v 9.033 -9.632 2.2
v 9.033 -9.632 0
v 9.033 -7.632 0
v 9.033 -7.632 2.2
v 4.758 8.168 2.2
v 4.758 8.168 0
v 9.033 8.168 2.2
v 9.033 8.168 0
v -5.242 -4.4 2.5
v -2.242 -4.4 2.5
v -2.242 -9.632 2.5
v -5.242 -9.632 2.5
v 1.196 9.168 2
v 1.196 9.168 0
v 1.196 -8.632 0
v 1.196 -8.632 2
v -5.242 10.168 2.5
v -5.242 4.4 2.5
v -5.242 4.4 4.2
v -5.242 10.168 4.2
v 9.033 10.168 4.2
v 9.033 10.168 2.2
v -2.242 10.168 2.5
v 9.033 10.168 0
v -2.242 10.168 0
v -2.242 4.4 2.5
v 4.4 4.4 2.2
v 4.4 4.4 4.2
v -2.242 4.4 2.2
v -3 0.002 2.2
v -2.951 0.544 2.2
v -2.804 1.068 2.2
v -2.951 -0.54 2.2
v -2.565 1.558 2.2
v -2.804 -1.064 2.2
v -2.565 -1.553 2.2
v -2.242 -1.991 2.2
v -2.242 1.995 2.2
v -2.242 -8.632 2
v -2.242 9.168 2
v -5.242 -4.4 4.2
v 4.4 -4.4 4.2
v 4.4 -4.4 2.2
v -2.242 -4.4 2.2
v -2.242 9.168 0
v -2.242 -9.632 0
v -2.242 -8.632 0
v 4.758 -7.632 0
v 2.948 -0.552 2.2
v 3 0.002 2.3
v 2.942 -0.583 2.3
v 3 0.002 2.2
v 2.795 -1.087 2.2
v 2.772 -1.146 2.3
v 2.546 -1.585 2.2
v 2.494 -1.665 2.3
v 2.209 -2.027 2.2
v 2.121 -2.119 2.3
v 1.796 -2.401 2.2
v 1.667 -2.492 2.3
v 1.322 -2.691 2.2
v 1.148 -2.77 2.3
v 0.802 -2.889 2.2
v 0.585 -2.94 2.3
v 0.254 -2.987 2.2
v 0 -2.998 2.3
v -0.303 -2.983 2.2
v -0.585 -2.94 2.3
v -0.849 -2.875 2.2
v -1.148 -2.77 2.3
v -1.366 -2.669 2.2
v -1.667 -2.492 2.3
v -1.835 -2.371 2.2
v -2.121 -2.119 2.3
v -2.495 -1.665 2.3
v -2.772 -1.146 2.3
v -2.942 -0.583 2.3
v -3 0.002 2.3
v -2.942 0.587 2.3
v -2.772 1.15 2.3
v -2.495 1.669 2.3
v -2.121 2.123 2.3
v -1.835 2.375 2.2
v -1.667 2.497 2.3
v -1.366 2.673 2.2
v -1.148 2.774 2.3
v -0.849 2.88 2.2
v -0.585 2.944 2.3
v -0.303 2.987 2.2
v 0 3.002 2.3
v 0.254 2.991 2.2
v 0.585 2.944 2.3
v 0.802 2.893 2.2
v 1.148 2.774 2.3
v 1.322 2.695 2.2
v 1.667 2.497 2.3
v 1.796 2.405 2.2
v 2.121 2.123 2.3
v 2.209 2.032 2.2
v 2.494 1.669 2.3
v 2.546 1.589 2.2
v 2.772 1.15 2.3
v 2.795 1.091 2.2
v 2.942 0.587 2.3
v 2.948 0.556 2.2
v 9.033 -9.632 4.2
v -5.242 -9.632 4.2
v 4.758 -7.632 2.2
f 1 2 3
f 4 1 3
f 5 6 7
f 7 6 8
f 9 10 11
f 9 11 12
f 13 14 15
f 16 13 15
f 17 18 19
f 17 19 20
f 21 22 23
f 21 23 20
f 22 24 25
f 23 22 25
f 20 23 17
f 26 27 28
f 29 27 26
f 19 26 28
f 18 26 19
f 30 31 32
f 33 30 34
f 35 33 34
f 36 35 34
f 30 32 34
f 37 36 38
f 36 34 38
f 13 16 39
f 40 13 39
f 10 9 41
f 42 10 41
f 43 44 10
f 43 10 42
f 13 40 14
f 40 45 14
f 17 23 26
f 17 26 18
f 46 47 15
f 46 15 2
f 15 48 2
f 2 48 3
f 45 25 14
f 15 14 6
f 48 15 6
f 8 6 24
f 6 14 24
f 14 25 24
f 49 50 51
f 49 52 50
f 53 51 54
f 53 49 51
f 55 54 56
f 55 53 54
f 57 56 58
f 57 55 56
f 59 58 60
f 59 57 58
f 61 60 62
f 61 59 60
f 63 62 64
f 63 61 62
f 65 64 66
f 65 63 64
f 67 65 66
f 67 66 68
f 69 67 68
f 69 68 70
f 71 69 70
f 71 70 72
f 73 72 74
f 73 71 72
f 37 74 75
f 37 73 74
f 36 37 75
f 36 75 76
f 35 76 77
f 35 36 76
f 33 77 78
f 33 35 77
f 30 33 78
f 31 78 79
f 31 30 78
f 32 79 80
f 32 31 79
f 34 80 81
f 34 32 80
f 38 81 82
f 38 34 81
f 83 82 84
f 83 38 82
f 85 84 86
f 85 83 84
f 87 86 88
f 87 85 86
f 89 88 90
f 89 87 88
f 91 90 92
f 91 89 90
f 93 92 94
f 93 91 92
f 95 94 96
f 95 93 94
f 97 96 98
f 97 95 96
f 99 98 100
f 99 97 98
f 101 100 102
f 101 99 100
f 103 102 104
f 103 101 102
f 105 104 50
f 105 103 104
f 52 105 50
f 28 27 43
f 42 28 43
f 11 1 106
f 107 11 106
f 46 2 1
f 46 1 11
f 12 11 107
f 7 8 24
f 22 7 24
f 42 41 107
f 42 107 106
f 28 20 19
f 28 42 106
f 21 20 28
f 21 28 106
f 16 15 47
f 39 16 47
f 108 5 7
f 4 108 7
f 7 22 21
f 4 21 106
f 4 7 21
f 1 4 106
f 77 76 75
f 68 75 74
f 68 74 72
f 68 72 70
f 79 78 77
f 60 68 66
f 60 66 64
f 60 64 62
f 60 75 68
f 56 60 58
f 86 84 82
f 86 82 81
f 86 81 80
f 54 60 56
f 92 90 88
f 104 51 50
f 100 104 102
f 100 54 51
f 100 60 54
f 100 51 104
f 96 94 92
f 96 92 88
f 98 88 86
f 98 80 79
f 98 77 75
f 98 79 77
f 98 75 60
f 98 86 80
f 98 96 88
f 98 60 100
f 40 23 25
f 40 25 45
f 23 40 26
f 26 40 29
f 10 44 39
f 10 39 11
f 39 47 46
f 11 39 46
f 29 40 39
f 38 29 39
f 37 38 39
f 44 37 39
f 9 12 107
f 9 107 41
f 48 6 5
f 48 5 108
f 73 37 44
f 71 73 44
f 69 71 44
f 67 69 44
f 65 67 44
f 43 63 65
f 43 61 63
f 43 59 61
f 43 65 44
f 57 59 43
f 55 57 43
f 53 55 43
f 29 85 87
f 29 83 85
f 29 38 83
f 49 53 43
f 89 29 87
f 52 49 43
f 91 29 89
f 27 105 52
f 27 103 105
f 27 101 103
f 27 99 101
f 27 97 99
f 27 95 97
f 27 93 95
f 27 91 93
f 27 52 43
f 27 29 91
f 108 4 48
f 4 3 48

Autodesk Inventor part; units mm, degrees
ref_plane "YZ Plane" through (0, 0, 0) normal (1, 0, 0) x (0, 1, 0)
ref_plane "XZ Plane" through (0, 0, 0) normal (0, 1, 0) x (-1, 0, 0)
ref_plane "Arbeitsebene1" through (0, 0, 0) normal (0, 0, 1) x (1, 0, 0)
sketch "Skizze1" plane through (0, 0, 0) normal (0, 0, 1) x (1, 0, 0)
  circle A0 centre (-0.0001, 0.0021) radius 3 projected
  circle A1 centre (11, 0) radius 2.566 projected
  circle A2 centre (-9.5, -11) radius 1.352 projected
  arc A3 (19, -13.5) -> (20, -12.5) centre (19, -12.5) ccw projected
  line L0 (20, -12.5) -> (20, 12.5) projected
  arc A4 (20, 12.5) -> (19, 13.5) centre (19, 12.5) ccw projected
  line L1 (19, 13.5) -> (-19, 13.5) projected
  arc A5 (-19, 13.5) -> (-20, 12.5) centre (-19, 12.5) ccw projected
  line L2 (-20, 12.5) -> (-20, -12.5) projected
  arc A6 (-20, -12.5) -> (-19, -13.5) centre (-19, -12.5) ccw projected
  line L3 (-19, -13.5) -> (19, -13.5) projected
  line L4 (18.6579, -7.132) -> (11.0758, -7.132) projected
  line L5 (18.6579, -7.132) -> (18.6579, 2.268) projected
  line L6 (18.6579, 2.268) -> (19.6579, 4.268) projected
  line L7 (19.6579, 4.268) -> (19.6579, 7.668) projected
  line L8 (18.0704, 7.668) -> (19.6579, 7.668) projected
  line L9 (18.0704, 7.668) -> (18.0704, 6.818) projected
  line L10 (18.0704, 6.818) -> (13.4704, 6.818) projected
  line L11 (13.4704, 6.818) -> (13.4704, 5.418) projected
  line L12 (13.4704, 5.418) -> (14.8704, 5.418) projected
  line L13 (14.8704, 5.418) -> (15.4704, 6.018) projected
  line L14 (15.4704, 6.018) -> (18.0704, 6.018) projected
  line L15 (18.0704, 6.018) -> (18.0704, 5.768) projected
  line L16 (18.0704, 5.768) -> (15.5704, 5.768) projected
  line L17 (15.5704, 5.768) -> (15.0704, 5.268) projected
  line L18 (15.0704, 5.268) -> (13.0704, 5.268) projected
  line L19 (13.0704, 5.268) -> (13.0704, 7.668) projected
  line L20 (6.4079, 7.668) -> (13.0704, 7.668) projected
  line L21 (6.4079, 7.668) -> (6.4079, 6.468) projected
  line L22 (4.7579, 6.468) -> (6.4079, 6.468) projected
  line L23 (4.7579, -7.132) -> (4.7579, 6.468) projected
  line L24 (5.4458, -7.132) -> (4.7579, -7.132) projected
  line L25 (5.4458, -7.132) -> (5.4458, -6.382) projected
  line L26 (5.4458, -6.382) -> (11.0758, -6.382) projected
  line L27 (11.0758, -6.382) -> (11.0758, -7.132) projected
  line L28 (9.0327, 10.168) -> (-5.2421, 10.168)
  line L29 (-5.2421, 10.168) -> (-5.2421, 8.168)
  line L30 (-5.2421, 8.168) -> (9.0327, 8.168)
  line L31 (9.0327, 8.168) -> (9.0327, 10.168)
  line L32 (-5.2421, 8.168) -> (4.7579, 8.168)
  line L33 (4.7579, 8.168) -> (4.7579, -9.632)
  line L34 (4.7579, -9.632) -> (-5.2421, -9.632)
  line L35 (-5.2421, -9.632) -> (-5.2421, 8.168)
  line L36 (4.7579, -9.632) -> (9.0327, -9.632)
  line L37 (9.0327, -9.632) -> (9.0327, -7.632)
  line L38 (9.0327, -7.632) -> (4.7579, -7.632)
  line L39 (4.7579, -7.632) -> (4.7579, -9.632)
  point P0 (0, 0)
  point P1 (4.7579, 8.168)
  dimension "d0" = 0
  dimension "d1" = 0.5
  dimension "d2" = 0.5
  dimension "d3" = 2
  dimension "d4" = 2
  dimension "d5" = 10
ref_plane "Arbeitsebene2" through (4.7579, -7.132, 2.2) normal (0, 0, 1) x (1, 0, 0)
extrude "Extrusion1" add sketch "Skizze1" along normal up to surface (2.2 mm away) contours A0 | L33 L34 L35 L30 L23 | L38 L37 L36 L33 | L30 L29 L28 L31
sketch "Skizze2" plane through (-5.2421, 10.168, 2.2) normal (0, 0, 1) x (1, 0, 0)
  line L0 (0, 0) -> (14.2747, 0) projected
  line L1 (0, -19.8) -> (0, 0) projected
  line L2 (14.2747, -19.8) -> (0, -19.8) projected
  line L3 (14.2747, -17.8) -> (14.2747, -19.8) projected
  line L4 (10, -17.8) -> (14.2747, -17.8) projected
  line L5 (10, -2) -> (10, -17.8) projected
  line L6 (14.2747, -2) -> (10, -2) projected
  line L7 (14.2747, 0) -> (14.2747, -2) projected
  line L8 (14.2747, 0) -> (0, 0) projected
  line L9 (14.2747, 0) -> (0, 0)
  line L10 (0, 0) -> (0, -19.8)
  line L11 (0, -19.8) -> (14.2747, -19.8)
  line L12 (14.2747, -19.8) -> (14.2747, 0)
  line L13 (9.6421, -14.568) -> (0.8421, -14.568)
  line L14 (0.8421, -14.568) -> (0.8421, -5.768)
  line L15 (0.8421, -5.768) -> (9.6421, -5.768)
  line L16 (9.6421, -5.768) -> (9.6421, -14.568)
  line L17 (9.6421, -14.568) -> (0.8421, -5.768) construction
  line L18 (0.8421, -14.568) -> (9.6421, -5.768) construction
  line L19 (0, 0) -> (0, -19.8) projected
  line L20 (0.8421, -5.768) -> (0, -5.768)
  line L21 (0, -5.768) -> (0, -14.568)
  line L22 (0, -14.568) -> (0.8421, -14.568)
  line L23 (0.8421, -14.568) -> (0.8421, -5.768)
  point P0 (5.2421, -10.168)
  point P1 (0, -5.768)
  point P2 (0.8421, -14.568)
  point P3 (14.2747, -17.8)
  point P4 (14.2747, -2)
  dimension "d8" = 8.8
  dimension "d9" = 8.8
extrude "Extrusion2" add sketch "Skizze2" along normal blind 2 contours L0 L7 L6 L5 L4 L3 L2 L1 L22 L13 L16 L15 L20 | L12 L4 L5 L6
sketch "Skizze3" plane through (0, 0, 0) normal (0, 0, -1) x (-1, 0, 0)
  line L0 (5.2421, 10.168) -> (5.2421, -9.632) projected
  line L1 (-9.0327, 10.168) -> (5.2421, 10.168) projected
  line L2 (-9.0327, 8.168) -> (-9.0327, 10.168) projected
  line L3 (-4.7579, 8.168) -> (-9.0327, 8.168) projected
  line L4 (-4.7579, -7.632) -> (-4.7579, 8.168) projected
  line L5 (-9.0327, -7.632) -> (-4.7579, -7.632) projected
  line L6 (-9.0327, -9.632) -> (-9.0327, -7.632) projected
  line L7 (5.2421, -9.632) -> (-9.0327, -9.632) projected
  line L8 (2.2421, -9.8367) -> (9.0217, -9.8367)
  line L9 (9.0217, -9.8367) -> (9.0217, 10.4786)
  line L10 (9.0217, 10.4786) -> (2.2421, 10.4786)
  line L11 (2.2421, 10.4786) -> (2.2421, -9.8367)
  line L12 (2.2421, -9.8367) -> (9.0217, 10.4786) construction
  line L13 (9.0217, -9.8367) -> (2.2421, 10.4786) construction
  point P0 (0, 0)
  point P1 (5.6319, 0.321)
  dimension "d12" = 3
extrude "Extrusion3" cut sketch "Skizze3" against normal blind 2.5 contours L1 L11 L10 L9 L8 L7 L0 | L0 L7 L11 L1
sketch "Skizze4" plane through (0, 0, 0) normal (0, 0, -1) x (-1, 0, 0)
  line L0 (2.2421, -9.632) -> (2.2421, 10.168) projected
  line L1 (-9.0327, 10.168) -> (2.2421, 10.168) projected
  line L2 (-9.0327, 8.168) -> (-9.0327, 10.168) projected
  line L3 (-4.7579, 8.168) -> (-9.0327, 8.168) projected
  line L4 (-4.7579, -7.632) -> (-4.7579, 8.168) projected
  line L5 (-9.0327, -7.632) -> (-4.7579, -7.632) projected
  line L6 (-9.0327, -9.632) -> (-9.0327, -7.632) projected
  line L7 (2.2421, -9.632) -> (-9.0327, -9.632) projected
  line L8 (2.2421, 4.4) -> (2.2421, 10.168) projected
  line L9 (2.2421, 9.168) -> (-1.1963, 9.168)
  line L10 (-1.1963, 9.168) -> (-1.1963, -8.632)
  line L11 (-1.1963, -8.632) -> (2.2421, -8.632)
  line L12 (2.2421, -8.632) -> (2.2421, 9.168)
  point P0 (0, 0)
  point P1 (2.2421, -8.632)
extrude "Extrusion4" cut sketch "Skizze4" against normal blind 2 contours L11 L10 L9 L0
sketch "Skizze5" plane through (4.4, -4.4, 2.2) normal (0, 0, 1) x (1, 0, 0)
  circle A0 centre (-4.4001, 4.4021) radius 3 projected
  point P0 (-4.4, 4.4)
extrude "Extrusion5" add sketch "Skizze5" along normal blind 0.1
equation "\"d6\" = d2"
properties part number "Anglerfish_Cameraspacer"
